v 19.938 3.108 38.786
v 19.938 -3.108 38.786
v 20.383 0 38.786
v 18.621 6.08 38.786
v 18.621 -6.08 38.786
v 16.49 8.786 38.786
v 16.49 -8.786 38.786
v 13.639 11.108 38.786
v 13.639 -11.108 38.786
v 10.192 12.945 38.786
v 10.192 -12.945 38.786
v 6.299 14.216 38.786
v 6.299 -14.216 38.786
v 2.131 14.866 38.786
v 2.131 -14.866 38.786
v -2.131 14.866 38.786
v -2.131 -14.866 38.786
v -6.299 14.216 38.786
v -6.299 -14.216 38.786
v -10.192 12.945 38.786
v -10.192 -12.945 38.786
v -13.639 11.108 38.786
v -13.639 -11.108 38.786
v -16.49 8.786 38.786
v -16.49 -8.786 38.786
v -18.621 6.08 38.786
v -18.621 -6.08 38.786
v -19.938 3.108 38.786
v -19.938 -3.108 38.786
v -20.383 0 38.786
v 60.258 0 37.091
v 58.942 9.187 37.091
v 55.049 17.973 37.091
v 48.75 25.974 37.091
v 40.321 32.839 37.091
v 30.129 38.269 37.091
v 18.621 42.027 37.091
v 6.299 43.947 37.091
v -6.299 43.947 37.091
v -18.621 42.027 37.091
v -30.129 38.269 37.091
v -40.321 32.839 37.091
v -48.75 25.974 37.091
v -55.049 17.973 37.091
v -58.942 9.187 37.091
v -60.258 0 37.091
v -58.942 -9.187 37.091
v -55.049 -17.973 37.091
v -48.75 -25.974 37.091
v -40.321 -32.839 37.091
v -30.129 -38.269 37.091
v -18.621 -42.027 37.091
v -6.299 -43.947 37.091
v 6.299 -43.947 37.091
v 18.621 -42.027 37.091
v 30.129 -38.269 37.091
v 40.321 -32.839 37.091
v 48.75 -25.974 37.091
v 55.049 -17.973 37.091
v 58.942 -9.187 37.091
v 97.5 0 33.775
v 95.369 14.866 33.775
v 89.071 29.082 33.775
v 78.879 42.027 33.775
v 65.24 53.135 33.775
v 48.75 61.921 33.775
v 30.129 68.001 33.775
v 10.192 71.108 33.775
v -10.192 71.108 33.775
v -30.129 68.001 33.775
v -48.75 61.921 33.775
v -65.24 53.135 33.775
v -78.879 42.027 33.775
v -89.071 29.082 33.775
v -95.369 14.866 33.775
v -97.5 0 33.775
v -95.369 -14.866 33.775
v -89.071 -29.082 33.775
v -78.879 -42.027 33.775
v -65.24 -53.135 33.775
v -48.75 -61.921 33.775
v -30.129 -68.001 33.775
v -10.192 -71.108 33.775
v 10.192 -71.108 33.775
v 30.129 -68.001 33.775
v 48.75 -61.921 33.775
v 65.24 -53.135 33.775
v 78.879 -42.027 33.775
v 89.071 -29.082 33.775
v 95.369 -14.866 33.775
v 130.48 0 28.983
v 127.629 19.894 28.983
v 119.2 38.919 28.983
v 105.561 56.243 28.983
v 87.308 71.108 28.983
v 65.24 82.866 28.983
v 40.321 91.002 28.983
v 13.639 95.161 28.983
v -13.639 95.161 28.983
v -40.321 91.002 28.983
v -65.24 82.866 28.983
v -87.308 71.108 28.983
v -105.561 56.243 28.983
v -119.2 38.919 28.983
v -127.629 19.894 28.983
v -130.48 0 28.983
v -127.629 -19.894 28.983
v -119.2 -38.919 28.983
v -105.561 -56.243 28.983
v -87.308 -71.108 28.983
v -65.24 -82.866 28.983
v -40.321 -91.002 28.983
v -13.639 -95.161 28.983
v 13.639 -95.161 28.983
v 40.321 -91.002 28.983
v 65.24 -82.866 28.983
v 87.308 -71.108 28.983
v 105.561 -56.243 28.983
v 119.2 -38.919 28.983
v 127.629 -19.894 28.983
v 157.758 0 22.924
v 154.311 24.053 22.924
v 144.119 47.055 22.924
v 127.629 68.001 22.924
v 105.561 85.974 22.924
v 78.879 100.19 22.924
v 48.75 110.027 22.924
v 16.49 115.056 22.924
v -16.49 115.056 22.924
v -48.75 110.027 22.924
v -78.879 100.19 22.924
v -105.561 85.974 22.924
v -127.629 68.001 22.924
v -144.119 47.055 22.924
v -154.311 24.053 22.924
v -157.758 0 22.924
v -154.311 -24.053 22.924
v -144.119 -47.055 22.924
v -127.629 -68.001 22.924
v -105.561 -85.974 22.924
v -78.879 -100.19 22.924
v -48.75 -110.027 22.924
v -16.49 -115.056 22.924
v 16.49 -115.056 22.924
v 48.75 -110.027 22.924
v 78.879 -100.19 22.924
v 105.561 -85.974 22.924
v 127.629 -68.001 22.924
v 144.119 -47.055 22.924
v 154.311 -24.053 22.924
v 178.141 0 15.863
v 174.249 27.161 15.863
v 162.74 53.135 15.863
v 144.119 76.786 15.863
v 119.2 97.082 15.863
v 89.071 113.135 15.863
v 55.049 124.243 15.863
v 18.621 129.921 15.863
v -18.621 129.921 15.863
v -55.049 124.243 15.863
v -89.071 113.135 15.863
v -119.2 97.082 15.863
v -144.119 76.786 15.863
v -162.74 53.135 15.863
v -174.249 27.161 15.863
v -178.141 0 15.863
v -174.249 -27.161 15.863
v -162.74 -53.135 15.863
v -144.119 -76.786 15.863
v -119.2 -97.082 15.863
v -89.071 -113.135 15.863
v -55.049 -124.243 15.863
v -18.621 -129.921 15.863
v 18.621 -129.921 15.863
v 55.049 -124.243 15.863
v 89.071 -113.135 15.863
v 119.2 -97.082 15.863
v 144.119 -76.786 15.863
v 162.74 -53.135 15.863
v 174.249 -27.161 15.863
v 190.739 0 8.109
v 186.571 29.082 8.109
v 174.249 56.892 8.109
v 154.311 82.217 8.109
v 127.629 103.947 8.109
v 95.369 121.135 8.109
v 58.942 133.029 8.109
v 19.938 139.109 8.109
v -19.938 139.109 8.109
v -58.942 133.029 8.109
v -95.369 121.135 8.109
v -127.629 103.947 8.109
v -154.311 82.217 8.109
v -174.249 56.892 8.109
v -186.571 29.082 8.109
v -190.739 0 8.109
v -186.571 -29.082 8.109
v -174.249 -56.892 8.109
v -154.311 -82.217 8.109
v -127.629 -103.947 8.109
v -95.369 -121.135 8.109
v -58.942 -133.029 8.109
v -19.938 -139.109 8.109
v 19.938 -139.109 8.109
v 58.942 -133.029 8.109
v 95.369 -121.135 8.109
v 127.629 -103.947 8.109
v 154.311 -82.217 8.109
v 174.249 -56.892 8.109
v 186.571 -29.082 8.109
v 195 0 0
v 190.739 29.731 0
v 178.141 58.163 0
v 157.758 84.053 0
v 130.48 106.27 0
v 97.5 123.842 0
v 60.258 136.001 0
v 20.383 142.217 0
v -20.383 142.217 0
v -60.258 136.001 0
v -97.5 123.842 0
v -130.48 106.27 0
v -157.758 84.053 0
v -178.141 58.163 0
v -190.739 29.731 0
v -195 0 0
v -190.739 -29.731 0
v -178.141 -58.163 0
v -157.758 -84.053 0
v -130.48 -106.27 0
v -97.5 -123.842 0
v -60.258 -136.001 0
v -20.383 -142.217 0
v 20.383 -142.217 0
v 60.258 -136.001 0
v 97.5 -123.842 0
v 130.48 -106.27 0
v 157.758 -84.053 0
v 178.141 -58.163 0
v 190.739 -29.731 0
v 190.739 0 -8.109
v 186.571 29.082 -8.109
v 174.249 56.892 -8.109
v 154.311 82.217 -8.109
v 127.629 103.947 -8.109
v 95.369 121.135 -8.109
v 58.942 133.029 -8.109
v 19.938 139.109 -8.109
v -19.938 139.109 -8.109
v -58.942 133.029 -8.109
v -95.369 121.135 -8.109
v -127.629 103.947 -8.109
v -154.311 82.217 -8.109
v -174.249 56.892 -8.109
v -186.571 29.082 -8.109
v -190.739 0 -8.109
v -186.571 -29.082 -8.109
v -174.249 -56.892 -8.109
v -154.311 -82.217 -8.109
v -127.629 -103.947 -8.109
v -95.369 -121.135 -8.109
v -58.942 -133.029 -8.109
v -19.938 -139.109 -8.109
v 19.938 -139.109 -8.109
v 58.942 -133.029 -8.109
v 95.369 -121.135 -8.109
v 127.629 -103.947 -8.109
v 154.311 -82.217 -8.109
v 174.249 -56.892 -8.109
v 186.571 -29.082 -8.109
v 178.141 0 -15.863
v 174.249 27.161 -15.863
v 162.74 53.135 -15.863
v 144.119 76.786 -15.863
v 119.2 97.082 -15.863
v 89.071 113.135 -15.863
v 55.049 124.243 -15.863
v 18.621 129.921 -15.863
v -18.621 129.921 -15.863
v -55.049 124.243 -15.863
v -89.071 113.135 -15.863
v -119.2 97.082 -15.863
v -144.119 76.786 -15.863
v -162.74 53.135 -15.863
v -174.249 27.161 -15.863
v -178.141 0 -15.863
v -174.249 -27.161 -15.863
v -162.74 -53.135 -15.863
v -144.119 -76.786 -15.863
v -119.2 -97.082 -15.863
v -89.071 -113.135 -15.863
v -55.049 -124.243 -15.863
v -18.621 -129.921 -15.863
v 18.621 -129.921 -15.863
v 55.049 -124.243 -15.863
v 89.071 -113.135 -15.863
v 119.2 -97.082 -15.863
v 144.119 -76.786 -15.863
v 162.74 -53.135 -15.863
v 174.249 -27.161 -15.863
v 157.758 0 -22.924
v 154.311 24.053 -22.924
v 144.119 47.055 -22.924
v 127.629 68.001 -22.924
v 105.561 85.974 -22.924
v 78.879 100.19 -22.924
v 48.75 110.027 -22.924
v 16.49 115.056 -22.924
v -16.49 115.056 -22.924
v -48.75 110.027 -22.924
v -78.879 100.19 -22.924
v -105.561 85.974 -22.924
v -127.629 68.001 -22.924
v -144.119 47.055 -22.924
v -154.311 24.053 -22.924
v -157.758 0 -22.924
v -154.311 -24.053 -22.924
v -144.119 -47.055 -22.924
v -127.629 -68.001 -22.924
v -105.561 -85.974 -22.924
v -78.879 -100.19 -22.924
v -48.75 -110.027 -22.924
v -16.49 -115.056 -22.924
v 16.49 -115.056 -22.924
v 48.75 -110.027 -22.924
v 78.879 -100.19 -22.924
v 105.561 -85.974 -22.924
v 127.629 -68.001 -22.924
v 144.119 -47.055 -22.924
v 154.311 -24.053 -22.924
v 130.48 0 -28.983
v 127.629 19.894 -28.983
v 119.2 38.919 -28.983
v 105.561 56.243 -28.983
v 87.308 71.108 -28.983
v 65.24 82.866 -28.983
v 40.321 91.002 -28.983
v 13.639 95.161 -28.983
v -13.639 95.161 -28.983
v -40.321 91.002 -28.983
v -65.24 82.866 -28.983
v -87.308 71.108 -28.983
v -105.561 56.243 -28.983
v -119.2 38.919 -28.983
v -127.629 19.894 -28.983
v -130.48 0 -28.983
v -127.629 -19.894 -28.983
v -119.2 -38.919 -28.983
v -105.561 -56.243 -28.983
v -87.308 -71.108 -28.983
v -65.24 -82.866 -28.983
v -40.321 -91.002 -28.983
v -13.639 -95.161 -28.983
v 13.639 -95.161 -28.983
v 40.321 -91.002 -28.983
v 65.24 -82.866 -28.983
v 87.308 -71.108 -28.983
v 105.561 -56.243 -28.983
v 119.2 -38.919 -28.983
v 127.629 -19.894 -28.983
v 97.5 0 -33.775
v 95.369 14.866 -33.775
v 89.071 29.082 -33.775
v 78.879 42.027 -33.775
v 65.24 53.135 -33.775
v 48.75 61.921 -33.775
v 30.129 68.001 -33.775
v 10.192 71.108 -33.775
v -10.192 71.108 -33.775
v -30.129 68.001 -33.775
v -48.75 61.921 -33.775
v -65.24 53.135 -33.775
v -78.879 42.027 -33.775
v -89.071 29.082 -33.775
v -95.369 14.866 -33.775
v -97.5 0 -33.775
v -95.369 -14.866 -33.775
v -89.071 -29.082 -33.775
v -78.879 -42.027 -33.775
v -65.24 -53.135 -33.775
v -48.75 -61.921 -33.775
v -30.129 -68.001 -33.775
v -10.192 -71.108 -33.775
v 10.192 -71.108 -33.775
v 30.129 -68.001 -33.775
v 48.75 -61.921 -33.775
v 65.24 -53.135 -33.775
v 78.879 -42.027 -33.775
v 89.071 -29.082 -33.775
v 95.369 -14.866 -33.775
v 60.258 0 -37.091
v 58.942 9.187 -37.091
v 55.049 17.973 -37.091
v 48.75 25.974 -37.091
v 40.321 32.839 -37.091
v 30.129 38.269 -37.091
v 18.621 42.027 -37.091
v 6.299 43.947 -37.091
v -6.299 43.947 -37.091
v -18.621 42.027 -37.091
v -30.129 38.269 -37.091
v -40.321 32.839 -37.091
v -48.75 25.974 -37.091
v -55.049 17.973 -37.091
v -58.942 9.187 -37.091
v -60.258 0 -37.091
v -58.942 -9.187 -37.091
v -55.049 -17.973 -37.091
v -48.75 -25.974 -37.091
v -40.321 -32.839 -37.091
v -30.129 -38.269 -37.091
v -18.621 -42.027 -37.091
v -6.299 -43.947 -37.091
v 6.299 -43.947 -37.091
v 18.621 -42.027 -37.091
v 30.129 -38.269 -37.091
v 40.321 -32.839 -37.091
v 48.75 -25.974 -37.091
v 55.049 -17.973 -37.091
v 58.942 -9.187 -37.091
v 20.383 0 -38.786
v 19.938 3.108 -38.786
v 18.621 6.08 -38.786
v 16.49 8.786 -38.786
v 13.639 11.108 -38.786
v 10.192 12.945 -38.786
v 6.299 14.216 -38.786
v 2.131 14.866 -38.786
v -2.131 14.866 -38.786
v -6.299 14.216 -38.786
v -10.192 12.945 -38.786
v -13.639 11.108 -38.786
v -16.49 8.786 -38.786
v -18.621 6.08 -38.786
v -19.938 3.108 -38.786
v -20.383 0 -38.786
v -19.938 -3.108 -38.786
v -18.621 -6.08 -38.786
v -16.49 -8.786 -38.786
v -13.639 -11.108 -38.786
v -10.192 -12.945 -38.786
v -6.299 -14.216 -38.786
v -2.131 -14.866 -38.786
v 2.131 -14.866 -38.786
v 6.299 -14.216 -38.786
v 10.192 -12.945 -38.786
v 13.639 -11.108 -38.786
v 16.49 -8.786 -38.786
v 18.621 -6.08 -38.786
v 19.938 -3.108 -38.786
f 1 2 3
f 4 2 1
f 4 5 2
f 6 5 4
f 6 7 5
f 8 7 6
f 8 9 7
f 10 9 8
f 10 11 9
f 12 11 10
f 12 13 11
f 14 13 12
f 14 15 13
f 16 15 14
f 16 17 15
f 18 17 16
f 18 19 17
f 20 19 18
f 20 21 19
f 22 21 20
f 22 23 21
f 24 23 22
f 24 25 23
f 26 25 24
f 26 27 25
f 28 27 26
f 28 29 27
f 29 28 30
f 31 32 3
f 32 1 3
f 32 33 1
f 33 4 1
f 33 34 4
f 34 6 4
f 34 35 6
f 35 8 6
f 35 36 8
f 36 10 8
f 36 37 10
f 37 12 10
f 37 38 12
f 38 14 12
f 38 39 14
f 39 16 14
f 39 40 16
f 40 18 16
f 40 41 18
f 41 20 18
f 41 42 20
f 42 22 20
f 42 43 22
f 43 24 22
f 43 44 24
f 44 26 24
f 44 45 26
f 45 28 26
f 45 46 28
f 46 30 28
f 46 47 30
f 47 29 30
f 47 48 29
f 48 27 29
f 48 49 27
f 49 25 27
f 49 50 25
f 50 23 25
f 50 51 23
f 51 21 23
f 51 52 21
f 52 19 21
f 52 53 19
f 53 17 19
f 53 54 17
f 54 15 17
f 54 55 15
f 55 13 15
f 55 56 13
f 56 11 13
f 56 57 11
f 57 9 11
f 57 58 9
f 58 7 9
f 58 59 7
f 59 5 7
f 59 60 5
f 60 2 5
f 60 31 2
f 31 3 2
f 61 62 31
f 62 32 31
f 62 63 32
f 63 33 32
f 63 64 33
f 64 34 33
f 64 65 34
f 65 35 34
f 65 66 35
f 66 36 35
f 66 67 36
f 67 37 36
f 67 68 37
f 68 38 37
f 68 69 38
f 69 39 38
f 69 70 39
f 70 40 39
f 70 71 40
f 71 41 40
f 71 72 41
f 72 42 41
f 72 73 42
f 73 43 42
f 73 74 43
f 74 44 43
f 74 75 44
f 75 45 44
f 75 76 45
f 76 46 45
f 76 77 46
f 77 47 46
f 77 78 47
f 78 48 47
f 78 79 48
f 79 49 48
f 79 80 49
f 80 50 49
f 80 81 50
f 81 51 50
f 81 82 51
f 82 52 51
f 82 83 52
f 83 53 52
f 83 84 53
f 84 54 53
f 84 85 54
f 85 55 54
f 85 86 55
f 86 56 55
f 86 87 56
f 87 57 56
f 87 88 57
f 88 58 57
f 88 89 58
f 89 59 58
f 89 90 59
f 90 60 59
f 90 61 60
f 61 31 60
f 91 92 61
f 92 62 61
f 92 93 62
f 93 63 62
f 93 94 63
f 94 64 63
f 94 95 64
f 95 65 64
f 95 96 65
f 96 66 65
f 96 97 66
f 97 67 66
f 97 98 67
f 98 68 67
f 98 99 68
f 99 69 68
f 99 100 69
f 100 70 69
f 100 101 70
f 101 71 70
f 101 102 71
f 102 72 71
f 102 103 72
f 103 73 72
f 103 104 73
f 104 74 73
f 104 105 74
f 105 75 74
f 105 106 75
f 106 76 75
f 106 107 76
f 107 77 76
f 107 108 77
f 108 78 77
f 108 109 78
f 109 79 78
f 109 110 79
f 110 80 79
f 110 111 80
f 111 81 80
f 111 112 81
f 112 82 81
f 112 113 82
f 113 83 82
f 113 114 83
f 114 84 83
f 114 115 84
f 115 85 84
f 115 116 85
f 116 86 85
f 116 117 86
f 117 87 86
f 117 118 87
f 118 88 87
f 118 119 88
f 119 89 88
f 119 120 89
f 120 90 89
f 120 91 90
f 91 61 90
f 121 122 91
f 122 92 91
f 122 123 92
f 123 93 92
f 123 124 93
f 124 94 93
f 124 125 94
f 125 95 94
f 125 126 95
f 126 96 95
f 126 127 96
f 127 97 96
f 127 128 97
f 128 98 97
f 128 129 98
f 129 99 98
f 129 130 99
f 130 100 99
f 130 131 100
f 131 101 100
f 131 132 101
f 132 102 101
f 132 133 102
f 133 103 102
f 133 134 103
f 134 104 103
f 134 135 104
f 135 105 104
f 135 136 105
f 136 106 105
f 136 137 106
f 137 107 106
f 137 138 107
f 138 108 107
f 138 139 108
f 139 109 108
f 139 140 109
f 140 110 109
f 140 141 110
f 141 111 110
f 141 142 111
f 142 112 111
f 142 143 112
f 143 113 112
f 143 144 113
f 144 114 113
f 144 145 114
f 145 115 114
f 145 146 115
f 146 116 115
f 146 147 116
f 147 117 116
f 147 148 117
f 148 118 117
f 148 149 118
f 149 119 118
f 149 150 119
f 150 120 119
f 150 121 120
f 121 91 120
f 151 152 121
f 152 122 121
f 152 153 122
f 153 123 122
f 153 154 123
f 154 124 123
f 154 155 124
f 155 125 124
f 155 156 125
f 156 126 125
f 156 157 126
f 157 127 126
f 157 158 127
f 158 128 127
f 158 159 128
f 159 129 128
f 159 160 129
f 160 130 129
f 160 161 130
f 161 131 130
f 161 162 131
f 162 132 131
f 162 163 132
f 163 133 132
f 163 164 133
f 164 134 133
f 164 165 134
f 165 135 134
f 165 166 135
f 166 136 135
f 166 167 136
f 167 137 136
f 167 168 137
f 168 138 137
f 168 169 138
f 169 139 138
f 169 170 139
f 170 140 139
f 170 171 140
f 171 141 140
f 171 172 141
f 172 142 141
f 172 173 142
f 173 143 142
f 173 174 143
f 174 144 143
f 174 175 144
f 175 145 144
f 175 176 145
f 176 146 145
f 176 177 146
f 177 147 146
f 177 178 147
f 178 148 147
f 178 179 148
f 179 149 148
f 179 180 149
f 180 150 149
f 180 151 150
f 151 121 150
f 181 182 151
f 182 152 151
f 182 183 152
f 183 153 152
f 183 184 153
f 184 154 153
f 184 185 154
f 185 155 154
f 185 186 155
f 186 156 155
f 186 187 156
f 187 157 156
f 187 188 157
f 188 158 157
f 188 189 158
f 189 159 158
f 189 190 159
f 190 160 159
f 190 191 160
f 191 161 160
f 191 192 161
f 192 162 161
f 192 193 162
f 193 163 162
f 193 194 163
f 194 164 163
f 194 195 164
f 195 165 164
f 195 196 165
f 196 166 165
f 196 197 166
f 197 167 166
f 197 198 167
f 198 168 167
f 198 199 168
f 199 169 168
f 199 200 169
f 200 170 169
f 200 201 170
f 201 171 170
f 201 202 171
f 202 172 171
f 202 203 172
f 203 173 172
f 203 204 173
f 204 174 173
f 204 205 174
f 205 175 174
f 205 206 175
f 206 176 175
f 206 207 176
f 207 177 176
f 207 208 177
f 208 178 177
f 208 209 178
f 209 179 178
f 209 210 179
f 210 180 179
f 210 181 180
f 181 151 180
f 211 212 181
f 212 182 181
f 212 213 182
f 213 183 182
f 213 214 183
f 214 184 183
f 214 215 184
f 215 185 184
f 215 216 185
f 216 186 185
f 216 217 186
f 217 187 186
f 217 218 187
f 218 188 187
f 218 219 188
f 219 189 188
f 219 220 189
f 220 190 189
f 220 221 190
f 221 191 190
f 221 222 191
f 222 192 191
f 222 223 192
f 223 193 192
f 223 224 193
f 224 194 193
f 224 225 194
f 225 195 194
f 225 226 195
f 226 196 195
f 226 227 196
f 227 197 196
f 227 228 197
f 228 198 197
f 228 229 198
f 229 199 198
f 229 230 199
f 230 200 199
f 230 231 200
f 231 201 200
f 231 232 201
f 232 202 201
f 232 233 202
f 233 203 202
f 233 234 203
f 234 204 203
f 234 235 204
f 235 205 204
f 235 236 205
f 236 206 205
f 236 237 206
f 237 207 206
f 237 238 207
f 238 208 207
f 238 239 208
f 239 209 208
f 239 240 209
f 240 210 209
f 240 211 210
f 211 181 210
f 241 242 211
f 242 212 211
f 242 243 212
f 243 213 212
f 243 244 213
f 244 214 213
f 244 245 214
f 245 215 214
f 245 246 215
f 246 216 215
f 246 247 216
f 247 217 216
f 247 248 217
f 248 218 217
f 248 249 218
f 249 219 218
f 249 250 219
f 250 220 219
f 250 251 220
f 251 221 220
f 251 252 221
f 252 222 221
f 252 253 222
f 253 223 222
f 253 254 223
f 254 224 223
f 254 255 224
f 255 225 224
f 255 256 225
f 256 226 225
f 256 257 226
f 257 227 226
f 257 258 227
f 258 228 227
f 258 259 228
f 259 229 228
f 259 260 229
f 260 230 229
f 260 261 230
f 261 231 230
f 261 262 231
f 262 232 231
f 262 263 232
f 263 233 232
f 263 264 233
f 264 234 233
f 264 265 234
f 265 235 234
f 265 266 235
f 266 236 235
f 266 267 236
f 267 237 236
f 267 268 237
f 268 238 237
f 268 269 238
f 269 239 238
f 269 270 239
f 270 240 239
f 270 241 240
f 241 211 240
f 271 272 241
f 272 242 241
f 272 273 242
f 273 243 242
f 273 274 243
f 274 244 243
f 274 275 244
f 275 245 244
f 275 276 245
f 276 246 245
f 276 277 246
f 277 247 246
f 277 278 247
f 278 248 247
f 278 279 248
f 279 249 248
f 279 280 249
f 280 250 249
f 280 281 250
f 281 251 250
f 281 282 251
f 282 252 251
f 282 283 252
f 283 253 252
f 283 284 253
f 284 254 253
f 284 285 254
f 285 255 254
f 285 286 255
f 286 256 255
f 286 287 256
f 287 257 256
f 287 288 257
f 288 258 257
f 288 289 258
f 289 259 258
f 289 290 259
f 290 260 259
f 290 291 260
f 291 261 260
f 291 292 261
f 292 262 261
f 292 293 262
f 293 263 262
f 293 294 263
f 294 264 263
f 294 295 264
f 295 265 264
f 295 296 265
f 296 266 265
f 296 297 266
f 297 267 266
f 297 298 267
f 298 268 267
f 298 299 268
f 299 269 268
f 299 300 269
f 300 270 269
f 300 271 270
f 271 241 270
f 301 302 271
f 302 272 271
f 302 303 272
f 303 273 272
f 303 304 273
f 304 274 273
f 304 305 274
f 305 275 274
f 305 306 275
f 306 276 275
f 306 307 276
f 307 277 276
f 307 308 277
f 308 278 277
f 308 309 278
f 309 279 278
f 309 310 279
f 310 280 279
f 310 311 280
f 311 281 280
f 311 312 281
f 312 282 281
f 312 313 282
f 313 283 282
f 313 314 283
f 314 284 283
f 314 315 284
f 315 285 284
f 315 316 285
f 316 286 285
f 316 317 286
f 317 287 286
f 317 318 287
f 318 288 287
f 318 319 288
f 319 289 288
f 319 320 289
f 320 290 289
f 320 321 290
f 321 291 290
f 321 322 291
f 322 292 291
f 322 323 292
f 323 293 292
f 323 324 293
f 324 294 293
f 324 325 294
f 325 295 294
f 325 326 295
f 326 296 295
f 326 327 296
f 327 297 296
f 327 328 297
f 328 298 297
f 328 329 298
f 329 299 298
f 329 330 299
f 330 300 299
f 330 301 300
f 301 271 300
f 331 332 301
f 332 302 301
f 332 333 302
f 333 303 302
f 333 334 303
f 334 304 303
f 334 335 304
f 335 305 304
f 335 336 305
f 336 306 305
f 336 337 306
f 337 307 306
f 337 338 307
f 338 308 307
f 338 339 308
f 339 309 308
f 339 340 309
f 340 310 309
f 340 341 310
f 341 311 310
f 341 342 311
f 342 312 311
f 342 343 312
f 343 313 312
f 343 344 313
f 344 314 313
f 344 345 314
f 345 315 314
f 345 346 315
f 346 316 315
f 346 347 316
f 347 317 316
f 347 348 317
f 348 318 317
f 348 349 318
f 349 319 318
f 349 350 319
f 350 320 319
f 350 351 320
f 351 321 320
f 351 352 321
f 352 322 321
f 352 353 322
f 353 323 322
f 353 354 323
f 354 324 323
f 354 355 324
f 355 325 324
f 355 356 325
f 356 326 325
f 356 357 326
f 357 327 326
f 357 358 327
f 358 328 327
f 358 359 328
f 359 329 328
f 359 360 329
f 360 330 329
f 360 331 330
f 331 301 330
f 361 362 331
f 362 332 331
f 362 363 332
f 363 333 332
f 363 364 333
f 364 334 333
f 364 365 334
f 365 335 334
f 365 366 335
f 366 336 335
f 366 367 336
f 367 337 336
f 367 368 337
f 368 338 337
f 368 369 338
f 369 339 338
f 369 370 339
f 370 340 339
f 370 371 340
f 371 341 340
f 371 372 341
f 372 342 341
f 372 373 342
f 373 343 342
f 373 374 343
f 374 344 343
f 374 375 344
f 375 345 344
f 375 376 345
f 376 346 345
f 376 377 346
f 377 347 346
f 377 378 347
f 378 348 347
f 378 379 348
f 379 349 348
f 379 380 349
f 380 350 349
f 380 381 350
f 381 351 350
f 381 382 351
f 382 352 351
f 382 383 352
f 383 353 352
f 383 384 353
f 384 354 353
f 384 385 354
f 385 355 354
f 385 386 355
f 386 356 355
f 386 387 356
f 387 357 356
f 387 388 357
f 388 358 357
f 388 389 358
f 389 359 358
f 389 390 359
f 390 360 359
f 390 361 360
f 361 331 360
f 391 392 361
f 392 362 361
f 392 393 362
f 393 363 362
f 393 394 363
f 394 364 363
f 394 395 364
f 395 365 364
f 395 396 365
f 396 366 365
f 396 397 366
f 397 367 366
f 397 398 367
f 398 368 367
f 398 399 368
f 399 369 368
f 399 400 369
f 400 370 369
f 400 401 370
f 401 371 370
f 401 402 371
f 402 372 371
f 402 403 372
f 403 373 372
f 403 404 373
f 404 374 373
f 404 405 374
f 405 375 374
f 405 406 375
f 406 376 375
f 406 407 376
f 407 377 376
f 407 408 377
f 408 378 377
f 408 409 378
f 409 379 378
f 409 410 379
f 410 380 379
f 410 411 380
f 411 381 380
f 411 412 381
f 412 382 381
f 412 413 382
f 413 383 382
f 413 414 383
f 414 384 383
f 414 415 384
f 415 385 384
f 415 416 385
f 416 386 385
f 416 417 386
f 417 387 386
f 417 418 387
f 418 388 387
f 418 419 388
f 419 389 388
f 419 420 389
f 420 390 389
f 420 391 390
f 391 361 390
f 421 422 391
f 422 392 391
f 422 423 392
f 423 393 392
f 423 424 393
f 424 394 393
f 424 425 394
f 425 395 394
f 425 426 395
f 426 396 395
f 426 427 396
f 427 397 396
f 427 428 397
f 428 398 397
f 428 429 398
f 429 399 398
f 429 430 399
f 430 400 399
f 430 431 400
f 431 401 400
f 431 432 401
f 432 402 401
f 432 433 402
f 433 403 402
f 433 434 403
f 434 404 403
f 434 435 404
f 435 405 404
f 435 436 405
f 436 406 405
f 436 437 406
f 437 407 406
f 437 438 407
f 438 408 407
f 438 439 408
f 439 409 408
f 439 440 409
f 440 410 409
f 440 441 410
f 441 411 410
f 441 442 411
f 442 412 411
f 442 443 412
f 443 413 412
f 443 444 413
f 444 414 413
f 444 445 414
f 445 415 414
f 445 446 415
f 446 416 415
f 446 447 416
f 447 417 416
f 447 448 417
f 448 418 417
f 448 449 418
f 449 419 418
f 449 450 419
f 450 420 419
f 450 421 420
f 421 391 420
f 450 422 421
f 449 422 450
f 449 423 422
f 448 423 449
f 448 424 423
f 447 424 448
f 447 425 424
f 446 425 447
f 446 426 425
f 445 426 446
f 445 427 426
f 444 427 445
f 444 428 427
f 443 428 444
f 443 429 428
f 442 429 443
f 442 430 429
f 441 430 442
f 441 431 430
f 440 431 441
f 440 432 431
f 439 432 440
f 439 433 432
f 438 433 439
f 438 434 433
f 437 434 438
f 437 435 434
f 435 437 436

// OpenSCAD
// Generated by SolidPython 1.0.1 on 2020-07-29 00:46:52


scale(v = [15, 11, 3]) {
	sphere(r = 13);
}
/***********************************************
*********      SolidPython code:      **********
************************************************
 
# import packages: SolidPython
from solid import *
from solid.utils import *
from itertools import chain, combinations, permutations


class Resize:

    def __init__(self, scad_file):
        self.scad_file = scad_file
        #self.scad_file = import_scad(scad_file)
        # cone/cylinder param:
        self.r1 = 0
        self.r2 = 0
        self.h = 0
        # rectangular prism param:
        self.w = 0
        self.l = 0
        # ellipse param:
        self.r = 0

    # import OpenScad code (file name corresponds to shape)


    # classify shape + parameters
    def assign(self, param1, param2, param3):
        if self.scad_file == 'cone.scad':
            self.r1 = param1
            self.r2 = param2
            self.h = param3
        elif self.scad_file == 'cylinder.scad':
            self.r1 = param1
            self.r2 = param2
            self.h = param3
        elif self.scad_file == 'rectangularPrism.scad':
            self.h = param1
            self.l = param2
            self.w = param3
        else:
            self.r = param1
            self.h = param2

    # resize parameters
    def iterate(self):
        x = range(3, 20, 2)
        i = 1
        if self.scad_file == 'cone.scad':
            tempList = list(permutations(x, 2))
            for temp in tempList:
                param1 = temp[0]
                param2 = temp[1]
                filepath = 'produced_scad_files/' + 'cone' + str(param1) + '_' + str(param2) + '_' + '.scad'
                scad_render_to_file(cylinder(h=param1, r1=param2, r2=0), filepath)

        elif self.scad_file == 'cylinder.scad':
            tempList = list(permutations(x, 3))
            for temp in tempList:
                param1 = temp[0]
                param2 = temp[1]
                filepath = 'produced_scad_files/' + 'cylinder' + str(param1) + '_' + str(param2) + '_' + '.scad'
                scad_render_to_file(cylinder(h=param1, r1=param2, r2=param2), filepath)

        elif self.scad_file == 'rectangularPrism.scad':
            tempList = list(permutations(x, 3))
            for temp in tempList:
                param1 = temp[0]
                param2 = temp[1]
                param3 = temp[2]
                filepath = 'produced_scad_files/' + 'rectangularPrism' + str(param1) + '_' + str(param2) + '_' + str(
                    param3) + '.scad'
                scad_render_to_file(cube(size=(param1, param2, param3)), filepath)

        elif self.scad_file == 'ellipse.scad':
            tempList = list(permutations(x, 4))
            for temp in tempList:
                param1 = temp[0]
                param2 = temp[1]
                param3 = temp[2]
                param4 = temp[3]
                filepath = 'produced_scad_files/' + 'ellipse' + str(param1) + '_' + str(param2) + '_' + str(param3) + '_' + str(param4) + '.scad'
                scad_render_to_file(scale([param1, param2, param3])(sphere(r=param4)), filepath)

    def render_to_scadfile(self):
        scad_render_to_file(scad, 'example.scad') 
 
************************************************/
